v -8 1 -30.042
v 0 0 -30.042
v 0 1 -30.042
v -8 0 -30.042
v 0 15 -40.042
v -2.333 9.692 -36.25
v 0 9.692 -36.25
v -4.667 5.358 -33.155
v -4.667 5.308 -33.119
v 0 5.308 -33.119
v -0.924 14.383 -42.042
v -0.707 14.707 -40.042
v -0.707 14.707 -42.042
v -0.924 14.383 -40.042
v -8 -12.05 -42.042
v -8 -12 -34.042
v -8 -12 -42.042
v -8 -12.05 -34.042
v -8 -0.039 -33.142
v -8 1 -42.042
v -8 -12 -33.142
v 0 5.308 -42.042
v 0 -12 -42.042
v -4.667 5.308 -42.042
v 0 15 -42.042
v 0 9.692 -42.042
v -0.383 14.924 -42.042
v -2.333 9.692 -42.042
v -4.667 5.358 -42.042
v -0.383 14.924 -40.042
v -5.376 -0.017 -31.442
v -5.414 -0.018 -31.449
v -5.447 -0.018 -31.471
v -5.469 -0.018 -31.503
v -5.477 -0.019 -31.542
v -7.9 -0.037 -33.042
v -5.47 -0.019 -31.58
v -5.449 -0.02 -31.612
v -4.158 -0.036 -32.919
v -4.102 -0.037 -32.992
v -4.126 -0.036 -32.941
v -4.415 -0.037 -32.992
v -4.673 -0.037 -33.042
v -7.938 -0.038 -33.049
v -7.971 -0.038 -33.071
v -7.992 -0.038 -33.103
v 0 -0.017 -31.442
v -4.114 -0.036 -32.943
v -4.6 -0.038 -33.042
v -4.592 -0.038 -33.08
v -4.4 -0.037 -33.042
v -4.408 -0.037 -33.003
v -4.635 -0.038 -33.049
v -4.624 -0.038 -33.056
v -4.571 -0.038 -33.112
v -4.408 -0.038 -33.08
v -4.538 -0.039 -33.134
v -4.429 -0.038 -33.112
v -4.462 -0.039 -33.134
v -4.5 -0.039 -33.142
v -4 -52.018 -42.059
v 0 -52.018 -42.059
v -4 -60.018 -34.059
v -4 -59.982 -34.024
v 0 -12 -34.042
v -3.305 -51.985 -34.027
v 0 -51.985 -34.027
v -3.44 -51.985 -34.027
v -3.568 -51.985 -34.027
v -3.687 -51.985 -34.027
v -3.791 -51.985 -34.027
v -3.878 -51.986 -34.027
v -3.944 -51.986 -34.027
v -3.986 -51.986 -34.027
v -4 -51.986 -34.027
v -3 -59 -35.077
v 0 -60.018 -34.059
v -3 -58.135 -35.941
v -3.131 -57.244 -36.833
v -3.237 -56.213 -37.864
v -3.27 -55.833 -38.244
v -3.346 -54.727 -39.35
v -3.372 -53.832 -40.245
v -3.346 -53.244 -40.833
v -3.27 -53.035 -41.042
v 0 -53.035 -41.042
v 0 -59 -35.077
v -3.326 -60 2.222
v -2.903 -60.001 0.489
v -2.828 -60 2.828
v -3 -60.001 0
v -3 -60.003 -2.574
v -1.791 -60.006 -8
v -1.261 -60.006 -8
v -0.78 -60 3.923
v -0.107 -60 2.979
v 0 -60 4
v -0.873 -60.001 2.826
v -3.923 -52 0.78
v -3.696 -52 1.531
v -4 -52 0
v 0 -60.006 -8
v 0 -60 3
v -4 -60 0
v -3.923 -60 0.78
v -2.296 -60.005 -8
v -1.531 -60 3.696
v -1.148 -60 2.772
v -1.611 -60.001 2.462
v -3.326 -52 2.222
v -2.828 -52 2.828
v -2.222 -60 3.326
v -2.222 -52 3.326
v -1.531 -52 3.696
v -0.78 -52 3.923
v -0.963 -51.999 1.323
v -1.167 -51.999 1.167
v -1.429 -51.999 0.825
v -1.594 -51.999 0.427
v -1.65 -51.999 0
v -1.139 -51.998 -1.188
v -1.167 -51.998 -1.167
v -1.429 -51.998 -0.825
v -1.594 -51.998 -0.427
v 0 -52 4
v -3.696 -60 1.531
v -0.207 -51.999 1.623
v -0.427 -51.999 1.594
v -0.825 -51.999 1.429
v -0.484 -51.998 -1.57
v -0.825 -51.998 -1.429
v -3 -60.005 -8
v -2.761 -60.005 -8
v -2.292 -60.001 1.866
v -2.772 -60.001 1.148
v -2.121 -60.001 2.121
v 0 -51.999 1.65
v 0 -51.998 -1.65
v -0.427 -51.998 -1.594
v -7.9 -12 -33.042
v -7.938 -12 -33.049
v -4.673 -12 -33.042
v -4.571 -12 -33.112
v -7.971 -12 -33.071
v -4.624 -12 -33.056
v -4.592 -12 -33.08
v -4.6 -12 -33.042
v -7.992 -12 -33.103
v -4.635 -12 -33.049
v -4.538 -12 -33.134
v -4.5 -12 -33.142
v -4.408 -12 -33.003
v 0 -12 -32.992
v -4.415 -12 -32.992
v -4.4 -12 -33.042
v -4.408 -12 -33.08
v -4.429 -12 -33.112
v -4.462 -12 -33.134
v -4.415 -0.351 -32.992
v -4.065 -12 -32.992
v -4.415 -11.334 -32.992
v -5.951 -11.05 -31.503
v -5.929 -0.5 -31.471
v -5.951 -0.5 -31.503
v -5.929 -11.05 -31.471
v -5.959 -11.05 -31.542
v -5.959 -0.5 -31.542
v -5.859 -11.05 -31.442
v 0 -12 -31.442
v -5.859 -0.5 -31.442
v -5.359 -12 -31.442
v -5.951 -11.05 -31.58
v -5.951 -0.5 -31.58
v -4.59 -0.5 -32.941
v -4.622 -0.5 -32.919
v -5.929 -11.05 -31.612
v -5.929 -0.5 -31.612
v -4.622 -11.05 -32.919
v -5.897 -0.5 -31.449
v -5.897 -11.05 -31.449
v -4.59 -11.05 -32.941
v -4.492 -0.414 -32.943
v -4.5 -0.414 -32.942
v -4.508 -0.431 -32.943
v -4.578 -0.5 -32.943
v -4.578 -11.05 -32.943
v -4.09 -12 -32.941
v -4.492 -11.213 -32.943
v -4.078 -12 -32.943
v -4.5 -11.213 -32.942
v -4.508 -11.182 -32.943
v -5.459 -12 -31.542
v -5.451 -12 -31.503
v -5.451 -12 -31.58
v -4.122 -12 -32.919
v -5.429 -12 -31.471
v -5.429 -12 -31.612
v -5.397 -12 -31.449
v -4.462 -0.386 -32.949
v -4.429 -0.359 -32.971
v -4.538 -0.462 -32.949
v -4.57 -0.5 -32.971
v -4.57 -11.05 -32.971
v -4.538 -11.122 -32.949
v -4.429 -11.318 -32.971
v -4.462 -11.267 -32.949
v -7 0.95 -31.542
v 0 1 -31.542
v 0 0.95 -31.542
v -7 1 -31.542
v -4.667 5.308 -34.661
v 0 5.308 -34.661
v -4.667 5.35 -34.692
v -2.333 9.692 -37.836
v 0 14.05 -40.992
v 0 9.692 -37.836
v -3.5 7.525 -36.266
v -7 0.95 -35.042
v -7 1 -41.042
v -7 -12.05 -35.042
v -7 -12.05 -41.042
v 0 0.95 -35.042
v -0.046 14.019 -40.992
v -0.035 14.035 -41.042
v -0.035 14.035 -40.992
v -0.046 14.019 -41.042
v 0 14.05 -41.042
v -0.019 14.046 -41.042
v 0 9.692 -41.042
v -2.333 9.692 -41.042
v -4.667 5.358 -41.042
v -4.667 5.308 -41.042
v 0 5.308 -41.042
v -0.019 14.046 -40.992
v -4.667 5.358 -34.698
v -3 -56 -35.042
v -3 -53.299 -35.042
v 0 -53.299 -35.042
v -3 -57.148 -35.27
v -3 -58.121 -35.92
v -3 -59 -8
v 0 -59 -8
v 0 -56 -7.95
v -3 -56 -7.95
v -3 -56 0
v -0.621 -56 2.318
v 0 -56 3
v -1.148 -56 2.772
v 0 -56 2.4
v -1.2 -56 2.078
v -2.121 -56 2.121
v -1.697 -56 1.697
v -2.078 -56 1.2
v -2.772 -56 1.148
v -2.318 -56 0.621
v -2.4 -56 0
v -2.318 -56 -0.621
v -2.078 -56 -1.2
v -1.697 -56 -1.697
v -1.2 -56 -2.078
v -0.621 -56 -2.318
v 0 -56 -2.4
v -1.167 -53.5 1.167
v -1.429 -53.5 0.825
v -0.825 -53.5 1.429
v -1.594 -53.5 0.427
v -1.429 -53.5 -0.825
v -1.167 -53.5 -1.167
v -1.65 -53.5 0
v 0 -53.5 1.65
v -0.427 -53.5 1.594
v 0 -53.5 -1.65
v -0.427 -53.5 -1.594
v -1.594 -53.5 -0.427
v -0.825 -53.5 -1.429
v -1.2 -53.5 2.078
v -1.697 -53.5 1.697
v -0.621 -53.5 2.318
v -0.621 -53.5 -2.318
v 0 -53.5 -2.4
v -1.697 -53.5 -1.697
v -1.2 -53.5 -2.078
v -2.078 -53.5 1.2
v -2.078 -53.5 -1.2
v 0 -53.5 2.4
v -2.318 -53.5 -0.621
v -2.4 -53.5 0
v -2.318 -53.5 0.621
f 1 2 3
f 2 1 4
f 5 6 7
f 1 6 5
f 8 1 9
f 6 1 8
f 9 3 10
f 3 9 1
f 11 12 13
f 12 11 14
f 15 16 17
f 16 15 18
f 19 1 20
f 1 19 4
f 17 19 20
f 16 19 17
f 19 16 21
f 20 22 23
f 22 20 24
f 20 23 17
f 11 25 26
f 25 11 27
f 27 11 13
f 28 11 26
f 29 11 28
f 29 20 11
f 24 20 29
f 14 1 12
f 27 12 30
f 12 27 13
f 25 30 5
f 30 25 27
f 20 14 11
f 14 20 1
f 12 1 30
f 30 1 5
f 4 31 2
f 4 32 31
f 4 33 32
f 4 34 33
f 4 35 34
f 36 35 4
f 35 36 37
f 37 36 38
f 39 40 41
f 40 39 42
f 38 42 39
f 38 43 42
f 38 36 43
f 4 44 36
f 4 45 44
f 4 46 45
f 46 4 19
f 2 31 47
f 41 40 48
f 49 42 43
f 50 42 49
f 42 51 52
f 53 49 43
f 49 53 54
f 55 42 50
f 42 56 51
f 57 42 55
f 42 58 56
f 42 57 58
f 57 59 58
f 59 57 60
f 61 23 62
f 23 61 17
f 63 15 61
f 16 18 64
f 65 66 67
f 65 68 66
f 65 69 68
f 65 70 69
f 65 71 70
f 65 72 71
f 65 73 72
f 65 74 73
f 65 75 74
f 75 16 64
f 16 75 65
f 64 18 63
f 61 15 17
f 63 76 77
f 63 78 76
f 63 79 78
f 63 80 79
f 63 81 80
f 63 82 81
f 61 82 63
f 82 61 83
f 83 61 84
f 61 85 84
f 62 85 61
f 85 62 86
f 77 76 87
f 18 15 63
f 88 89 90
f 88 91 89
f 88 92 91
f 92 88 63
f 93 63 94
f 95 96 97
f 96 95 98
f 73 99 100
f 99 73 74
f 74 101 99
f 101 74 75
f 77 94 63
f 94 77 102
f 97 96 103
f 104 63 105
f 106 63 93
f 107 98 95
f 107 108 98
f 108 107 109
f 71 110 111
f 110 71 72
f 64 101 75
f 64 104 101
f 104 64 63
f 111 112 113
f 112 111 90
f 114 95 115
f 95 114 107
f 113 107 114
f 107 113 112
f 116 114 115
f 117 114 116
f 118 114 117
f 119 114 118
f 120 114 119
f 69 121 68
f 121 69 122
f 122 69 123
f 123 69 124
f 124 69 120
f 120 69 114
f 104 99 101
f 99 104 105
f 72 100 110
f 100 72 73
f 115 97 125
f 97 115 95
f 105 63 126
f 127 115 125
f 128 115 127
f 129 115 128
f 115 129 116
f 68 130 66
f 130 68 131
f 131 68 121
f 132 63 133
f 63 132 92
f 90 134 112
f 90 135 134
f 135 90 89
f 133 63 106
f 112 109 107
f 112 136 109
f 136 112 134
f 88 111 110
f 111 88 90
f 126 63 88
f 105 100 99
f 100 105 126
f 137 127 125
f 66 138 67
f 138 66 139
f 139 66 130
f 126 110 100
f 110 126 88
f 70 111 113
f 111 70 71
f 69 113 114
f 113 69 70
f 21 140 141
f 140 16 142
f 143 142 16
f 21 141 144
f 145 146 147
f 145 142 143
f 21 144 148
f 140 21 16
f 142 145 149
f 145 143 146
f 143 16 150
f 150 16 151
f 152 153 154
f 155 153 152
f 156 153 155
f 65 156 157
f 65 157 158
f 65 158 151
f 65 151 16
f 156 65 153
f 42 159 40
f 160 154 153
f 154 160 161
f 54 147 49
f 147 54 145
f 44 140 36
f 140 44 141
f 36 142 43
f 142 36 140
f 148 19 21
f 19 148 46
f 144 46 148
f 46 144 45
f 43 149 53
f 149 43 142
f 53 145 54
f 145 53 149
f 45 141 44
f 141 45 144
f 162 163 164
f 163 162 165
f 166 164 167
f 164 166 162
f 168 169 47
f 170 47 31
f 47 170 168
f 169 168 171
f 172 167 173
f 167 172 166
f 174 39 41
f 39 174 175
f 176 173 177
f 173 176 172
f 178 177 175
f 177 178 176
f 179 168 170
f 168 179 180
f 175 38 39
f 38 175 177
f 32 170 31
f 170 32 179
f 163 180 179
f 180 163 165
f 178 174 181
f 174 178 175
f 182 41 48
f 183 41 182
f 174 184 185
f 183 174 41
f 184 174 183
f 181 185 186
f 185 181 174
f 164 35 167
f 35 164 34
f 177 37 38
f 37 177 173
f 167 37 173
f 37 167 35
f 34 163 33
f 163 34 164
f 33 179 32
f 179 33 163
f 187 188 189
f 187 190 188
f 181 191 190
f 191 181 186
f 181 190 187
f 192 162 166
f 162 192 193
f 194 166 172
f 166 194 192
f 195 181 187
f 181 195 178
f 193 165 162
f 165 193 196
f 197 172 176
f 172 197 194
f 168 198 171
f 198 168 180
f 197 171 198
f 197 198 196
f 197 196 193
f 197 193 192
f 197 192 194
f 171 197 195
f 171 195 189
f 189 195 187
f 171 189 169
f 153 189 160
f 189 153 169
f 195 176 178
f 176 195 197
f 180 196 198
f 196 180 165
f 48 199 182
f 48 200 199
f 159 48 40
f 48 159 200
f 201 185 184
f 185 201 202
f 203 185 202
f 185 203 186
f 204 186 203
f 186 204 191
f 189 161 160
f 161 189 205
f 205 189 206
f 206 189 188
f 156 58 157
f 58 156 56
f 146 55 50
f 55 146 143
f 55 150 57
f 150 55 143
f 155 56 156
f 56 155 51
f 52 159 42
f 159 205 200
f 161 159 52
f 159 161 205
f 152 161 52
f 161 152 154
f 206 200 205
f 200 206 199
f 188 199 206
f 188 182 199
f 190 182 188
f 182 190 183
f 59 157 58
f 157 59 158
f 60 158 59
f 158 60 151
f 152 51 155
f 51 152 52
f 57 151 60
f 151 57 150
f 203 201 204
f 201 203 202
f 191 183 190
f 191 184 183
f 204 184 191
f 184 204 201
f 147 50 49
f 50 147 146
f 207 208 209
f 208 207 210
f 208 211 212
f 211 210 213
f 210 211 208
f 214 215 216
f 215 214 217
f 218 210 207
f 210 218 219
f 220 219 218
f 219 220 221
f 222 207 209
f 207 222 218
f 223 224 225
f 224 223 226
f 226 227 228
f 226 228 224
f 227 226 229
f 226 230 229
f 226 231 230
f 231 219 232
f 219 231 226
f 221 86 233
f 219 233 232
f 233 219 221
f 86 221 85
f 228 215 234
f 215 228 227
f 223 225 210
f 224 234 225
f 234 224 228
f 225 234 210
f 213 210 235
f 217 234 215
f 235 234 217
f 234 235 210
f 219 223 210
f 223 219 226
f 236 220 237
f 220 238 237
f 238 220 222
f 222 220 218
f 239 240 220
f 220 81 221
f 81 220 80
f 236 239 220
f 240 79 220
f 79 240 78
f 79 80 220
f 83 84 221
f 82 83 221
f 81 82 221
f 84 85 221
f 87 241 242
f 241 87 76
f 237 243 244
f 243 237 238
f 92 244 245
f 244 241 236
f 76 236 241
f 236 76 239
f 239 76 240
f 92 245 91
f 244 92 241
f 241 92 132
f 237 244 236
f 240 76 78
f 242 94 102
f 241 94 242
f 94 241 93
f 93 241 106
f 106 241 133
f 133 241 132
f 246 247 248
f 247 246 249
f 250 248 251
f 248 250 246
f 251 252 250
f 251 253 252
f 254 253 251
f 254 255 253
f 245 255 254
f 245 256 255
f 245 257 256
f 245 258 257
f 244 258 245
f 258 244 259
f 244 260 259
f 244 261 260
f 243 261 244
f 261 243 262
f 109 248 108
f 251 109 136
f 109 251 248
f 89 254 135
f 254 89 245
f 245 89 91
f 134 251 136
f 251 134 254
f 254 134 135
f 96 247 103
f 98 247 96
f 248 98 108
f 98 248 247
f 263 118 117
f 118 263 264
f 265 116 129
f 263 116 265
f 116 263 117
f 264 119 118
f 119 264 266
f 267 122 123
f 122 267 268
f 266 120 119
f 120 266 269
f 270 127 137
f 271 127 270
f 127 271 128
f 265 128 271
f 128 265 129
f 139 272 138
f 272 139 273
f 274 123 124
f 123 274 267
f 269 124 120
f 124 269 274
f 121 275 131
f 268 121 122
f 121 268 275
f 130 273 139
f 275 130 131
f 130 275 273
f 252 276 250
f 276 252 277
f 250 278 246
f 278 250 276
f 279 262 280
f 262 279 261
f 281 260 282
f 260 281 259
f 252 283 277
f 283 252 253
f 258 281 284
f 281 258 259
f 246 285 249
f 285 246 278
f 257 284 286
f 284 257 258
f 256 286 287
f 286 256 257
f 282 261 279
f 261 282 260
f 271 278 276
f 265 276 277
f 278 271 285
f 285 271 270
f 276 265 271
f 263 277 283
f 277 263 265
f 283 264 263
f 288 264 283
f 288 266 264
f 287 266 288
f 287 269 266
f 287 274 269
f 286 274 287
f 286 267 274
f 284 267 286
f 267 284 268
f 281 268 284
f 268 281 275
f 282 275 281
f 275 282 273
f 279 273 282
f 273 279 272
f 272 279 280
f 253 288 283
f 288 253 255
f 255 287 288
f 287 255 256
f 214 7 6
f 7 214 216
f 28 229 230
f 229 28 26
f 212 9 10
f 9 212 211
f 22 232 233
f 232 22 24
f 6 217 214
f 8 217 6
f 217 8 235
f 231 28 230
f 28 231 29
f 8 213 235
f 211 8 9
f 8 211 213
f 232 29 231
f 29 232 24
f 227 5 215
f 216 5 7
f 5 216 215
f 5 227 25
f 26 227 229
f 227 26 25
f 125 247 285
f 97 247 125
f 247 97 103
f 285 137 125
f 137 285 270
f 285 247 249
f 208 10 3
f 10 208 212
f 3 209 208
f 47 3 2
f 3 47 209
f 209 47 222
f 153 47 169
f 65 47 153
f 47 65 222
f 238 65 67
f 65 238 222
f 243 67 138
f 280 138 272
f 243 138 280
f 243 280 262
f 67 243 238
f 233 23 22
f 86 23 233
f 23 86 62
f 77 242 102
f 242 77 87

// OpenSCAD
/******************************************************************
*                                                                 *
* OpenFlexure Microscope: Illumination arm                        *
*                                                                 *
* This is part of the OpenFlexure microscope, an open-source      *
* microscope and 3-axis translation stage.  It gets really good   *
* precision over a ~10mm range, by using plastic flexure          *
* mechanisms.                                                     *
*                                                                 *
* (c) Richard Bowman, January 2016                                *
* Released under the CERN Open Hardware License                   *
*                                                                 *
******************************************************************/

use <utilities.scad>;
use <dovetail.scad>;
$fn=16;
d=0.05;

big_stage = false;
// MAKE SURE THESE MATCH THE VARIABLES IN main_body.scad
sample_z = big_stage?70:40; //height of the top of the stage
leg_r = big_stage?30:25;
stage_t=5; //thickness of the stage (at thickest point, most is 1mm less)
clip_w = 16; //external width of clip for dovetail
//clip_y is no longer correct - need to take the value from main_body.scad
//clip_y = -leg_r-8; //position of clip relative to optical axis
clip_h = 12; //height of dovetail clip
bottom = -15; //the foot extends below the bottom of the dovetail

//the dovetail should sit at ([0,-leg_r-2,sample_z+5])
//the LED should sit at ([0,0,sample_z+30])
led_z = 12;
dt_h = 13;
below_led = 6;
led_r = 3/2*1.1;
led_angle = 20;
working_distance = clip_h;

/*
intersection(){
	cylinder(r=999,h=999,$fn=8);
//rotate([atan(25/(leg_r+3)),0,0])
	translate([0,0,-led_z+below_led]) //rotate([atan((25+3-14)/(leg_r)),180,0])
    rotate(atan((led_z-below_led-5)/(leg_r+2)),[1,0,0])
    difference(){
		union(){
			translate([0,leg_r+2,5]) dovetail_m([clip_w,2,dt_h]);
			hull(){
				translate([-clip_w/2,leg_r+d,5]) cube([clip_w,d,dt_h]);
				translate([0,0,led_z-below_led]) cylinder(r=4,h=below_led+1);
			}
		}
		#translate([0,0,led_z-4]) cylinder(r=led_r,h=5);
		translate([0,0,led_z]) cylinder(r=led_r+1,h=999);
		translate([0,0,led_z-30-2]) cylinder(r1=led_r+30*tan(led_angle),r2=led_r,h=30);
	}
}*/

module back_foot_and_illumination(clip_y=-35,sample_z=40){
    // Arm that clips on to the microscope, providing the back foot
    // and illumination mount
    w = clip_w; //width (size in x direction)
    b = 8; //breadth (size of main pillar in y direction)
    back = clip_y-b-1; //y coordinate of back of pillar
    wd = working_distance;
    difference(){
        union(){
            sequential_hull(){
                translate([0,back,bottom+1]) rotate([-90,0,0])cylinder(r=1,h=2); //foot
                translate([-w/2,back,-1]) cube([w,b+4,1]); //height stop
                translate([-w/2,back,0]) cube([w,b,d]); //dovetail mounts here
                translate([-w/2,back,clip_h]) cube([w,b,d]);//main shaft
                translate([0,back+b/2,sample_z+wd+b/2]) rotate([45,0,0]) cube([8,b*sqrt(2),d],center=true);
                //rotate([0,90,0]) cylinder(d=b,h=8,$fn=16,center=true);
                translate([0,0,sample_z+wd]) cylinder(r=4,h=8,$fn=32);
            }
            translate([0,clip_y,0]) dovetail_m([clip_w,3,clip_h],r=0.1);
        }
        
        // make the structure hollow, for faster printing and 
        // cable management
        sequential_hull(){
            translate([0,back+1,bottom+1]) rotate([-90,0,0]) cylinder(r=d,h=d); //foot
            translate([-w/2+1,back+1,-1]) cube([w-2,b+2-0.5,d]); //height stop
            translate([-w/2+1,back+1,-1]) cube([w-2,b-2,d]); //dovetail mounts here
            translate([-w/2+1,back+1,clip_h]) cube([w-2,b-2,d]);//main shaft
            translate([0,back+b/2,sample_z+wd+b/2]) rotate([0,90,0]) cylinder(d=b-2,h=8-2,$fn=16,center=true);
            translate([-3,-8,sample_z+wd+4]) cube([6,d,3]);
            translate([-3,-8,sample_z+wd+4]) cube([6,8,10]);
            translate([0,0,sample_z+wd+4]) cylinder(r=3,h=999);
        }
        // exit holes for cable (option to leave from front or back)
        hull(){
            b=bottom+2;
            translate([0,0,-1+b/3])cube([(w-2)*2/3,999,d],center=true);
            translate([0,0,-1+2*b/3])cube([(w-2)/3,999,d],center=true);
        }
        
        // Holes for LED and beam
        translate([0,0,sample_z+10+3.5]){
            cylinder(r=3*1.1/2,h=999,center=true,$fn=24);
            cylinder(r=4*1.2/2,h=999,$fn=24);
        }
        translate([0,0,sample_z]) cylinder(h=10+2,r1=12*tan(led_angle/2)+3/2,r2=3/2);
    }
}

difference(){
// standard size
rotate([90,0,0]) back_foot_and_illumination(clip_y=-33.0416, sample_z=40);
// large stage version
//rotate([90,0,0]) back_foot_and_illumination(clip_y=-36.5772, sample_z=70);
rotate([0,90,0]) cylinder(r=999,h=999,$fn=8);
}
